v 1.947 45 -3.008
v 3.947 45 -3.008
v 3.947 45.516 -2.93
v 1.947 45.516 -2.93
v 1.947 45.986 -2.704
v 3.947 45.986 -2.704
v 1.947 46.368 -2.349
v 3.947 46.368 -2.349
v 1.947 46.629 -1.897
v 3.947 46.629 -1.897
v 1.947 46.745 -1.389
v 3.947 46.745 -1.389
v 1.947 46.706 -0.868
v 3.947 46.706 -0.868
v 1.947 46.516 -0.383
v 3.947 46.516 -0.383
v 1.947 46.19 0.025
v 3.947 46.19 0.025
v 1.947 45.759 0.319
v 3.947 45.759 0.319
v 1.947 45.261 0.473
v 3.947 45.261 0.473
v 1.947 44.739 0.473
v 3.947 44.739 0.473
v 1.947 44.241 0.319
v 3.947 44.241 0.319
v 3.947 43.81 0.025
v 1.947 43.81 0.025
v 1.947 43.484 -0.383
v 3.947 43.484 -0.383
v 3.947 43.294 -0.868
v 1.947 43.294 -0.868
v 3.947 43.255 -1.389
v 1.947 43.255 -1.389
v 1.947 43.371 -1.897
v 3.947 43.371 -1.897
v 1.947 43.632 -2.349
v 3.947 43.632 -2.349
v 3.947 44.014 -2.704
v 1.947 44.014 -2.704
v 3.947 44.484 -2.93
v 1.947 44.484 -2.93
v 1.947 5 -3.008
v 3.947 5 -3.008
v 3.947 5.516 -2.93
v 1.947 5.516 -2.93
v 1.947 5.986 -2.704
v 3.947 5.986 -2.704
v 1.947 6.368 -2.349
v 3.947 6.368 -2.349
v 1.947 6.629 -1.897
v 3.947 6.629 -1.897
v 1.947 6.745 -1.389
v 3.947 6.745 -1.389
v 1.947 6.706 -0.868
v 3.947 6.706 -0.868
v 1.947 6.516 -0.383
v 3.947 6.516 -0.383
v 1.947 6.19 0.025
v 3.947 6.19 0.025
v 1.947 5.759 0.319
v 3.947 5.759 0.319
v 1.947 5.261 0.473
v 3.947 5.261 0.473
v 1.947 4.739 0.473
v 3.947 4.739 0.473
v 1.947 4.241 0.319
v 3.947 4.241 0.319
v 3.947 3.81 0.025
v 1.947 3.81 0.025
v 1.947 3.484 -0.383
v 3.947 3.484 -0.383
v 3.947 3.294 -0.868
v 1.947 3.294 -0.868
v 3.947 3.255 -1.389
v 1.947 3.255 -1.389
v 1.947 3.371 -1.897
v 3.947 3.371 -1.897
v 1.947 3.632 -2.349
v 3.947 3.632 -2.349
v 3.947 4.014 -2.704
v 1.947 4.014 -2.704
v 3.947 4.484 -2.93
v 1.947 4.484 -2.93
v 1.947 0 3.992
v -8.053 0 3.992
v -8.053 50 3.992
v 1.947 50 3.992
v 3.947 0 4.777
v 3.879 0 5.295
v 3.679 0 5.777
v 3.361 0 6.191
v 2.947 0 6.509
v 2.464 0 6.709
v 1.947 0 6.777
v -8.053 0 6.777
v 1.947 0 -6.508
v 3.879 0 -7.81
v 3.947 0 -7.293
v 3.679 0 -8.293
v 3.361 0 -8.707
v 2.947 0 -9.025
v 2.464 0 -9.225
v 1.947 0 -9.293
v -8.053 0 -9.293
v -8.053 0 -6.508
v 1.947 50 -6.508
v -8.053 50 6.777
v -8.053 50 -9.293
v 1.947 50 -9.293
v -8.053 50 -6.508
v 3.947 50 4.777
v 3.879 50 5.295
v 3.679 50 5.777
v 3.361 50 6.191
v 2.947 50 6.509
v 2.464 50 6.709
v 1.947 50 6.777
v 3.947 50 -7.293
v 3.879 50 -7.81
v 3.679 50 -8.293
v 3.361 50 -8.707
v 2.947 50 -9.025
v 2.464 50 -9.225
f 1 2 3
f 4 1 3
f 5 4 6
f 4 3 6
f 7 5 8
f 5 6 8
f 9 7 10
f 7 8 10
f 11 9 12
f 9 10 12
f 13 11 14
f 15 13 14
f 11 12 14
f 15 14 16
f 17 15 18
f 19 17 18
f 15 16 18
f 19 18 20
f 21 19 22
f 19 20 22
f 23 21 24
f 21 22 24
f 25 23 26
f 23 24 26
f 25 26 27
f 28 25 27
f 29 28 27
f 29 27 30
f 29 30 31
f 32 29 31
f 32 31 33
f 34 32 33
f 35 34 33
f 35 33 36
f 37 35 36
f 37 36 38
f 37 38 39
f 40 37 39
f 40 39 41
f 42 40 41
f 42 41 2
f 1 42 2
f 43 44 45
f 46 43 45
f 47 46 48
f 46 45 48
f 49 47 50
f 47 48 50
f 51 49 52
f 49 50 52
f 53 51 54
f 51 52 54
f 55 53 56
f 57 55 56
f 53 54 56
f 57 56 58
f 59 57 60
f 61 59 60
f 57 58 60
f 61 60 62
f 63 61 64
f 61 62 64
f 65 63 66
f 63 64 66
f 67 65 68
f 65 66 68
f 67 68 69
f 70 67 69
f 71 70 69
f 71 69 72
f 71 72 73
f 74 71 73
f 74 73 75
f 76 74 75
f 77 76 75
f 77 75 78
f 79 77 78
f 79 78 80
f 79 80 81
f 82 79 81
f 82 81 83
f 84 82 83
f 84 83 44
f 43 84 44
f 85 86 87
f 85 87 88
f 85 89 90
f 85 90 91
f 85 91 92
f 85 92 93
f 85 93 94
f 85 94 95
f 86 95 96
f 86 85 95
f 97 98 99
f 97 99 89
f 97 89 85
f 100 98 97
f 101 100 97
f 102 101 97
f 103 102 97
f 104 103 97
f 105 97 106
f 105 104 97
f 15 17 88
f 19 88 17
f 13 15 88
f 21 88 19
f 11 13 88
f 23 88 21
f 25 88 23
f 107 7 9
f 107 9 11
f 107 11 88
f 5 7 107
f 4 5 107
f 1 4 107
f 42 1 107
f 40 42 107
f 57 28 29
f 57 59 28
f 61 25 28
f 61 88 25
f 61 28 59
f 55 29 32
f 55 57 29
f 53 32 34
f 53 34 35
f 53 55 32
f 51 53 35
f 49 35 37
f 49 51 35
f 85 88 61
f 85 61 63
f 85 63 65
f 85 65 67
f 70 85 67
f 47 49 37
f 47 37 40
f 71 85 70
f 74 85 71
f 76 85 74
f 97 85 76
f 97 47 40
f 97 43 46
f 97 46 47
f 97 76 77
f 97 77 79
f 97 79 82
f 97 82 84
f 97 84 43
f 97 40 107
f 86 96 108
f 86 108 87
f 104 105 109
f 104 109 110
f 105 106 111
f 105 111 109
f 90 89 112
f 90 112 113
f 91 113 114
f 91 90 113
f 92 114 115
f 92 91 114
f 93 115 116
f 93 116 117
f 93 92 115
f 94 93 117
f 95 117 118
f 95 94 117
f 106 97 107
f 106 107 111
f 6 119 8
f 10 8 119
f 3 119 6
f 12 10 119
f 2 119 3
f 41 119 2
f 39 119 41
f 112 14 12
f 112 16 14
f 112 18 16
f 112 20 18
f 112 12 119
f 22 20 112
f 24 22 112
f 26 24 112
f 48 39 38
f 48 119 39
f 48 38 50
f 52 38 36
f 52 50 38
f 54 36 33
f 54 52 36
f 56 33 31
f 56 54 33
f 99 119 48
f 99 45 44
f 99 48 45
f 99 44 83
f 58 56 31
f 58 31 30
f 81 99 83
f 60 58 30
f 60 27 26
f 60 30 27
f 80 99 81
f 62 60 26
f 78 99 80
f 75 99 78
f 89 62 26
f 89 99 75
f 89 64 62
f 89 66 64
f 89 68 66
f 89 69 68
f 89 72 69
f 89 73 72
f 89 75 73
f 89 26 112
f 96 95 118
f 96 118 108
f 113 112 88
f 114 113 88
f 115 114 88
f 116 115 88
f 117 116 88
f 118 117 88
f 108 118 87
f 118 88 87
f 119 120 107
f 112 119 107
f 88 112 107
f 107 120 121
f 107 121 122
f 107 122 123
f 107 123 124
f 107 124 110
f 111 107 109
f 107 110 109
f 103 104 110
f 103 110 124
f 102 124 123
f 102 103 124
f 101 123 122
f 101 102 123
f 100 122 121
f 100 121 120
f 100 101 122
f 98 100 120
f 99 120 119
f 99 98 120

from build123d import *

# Parameters (mm, degrees)
EXTRUDE_1_DEPTH     = 50
SKETCH_2_R          = 1.75
CUT_EXTRUDE_1_DEPTH = 53.252813616


with BuildPart() as part:
    # 草图1 → 凸台-拉伸1 (new body)
    with BuildSketch(Plane(origin=(0, 0, 0), x_dir=(1, 0, 0), z_dir=(0, 1, 0))):
        with BuildLine():
            Line((-8.053167235, 9.292821463), (1.946832765, 9.292821463))
            ThreePointArc((1.946832765, 9.292821463), (3.361046328, 8.707035025), (3.946832765, 7.292821463))
            Line((3.946832765, 7.292821463), (3.946832765, -4.777178537))
            ThreePointArc((3.946832765, -4.777178537), (3.361046328, -6.191392099), (1.946832765, -6.777178537))
            Line((1.946832765, -6.777178537), (-8.053167235, -6.777178537))
            Line((-8.053167235, -6.777178537), (-8.053167235, -3.992178537))
            Line((-8.053167235, -3.992178537), (1.946832765, -3.992178537))
            Line((1.946832765, -3.992178537), (1.946832765, 6.507821463))
            Line((1.946832765, 6.507821463), (-8.053167235, 6.507821463))
            Line((-8.053167235, 6.507821463), (-8.053167235, 9.292821463))
        make_face()
    extrude(amount=EXTRUDE_1_DEPTH)

    # 草图2 → 切除-拉伸1 (cut, through all)
    with BuildSketch(Plane(origin=(3.946832765, 0, 0), x_dir=(0, 0, -1), z_dir=(1, 0, 0))):
        with Locations((1.257821463, 45)):
            Circle(SKETCH_2_R)
        with Locations((1.257821463, 5)):
            Circle(SKETCH_2_R)
    extrude(amount=-CUT_EXTRUDE_1_DEPTH, mode=Mode.SUBTRACT)


solid = part.part
